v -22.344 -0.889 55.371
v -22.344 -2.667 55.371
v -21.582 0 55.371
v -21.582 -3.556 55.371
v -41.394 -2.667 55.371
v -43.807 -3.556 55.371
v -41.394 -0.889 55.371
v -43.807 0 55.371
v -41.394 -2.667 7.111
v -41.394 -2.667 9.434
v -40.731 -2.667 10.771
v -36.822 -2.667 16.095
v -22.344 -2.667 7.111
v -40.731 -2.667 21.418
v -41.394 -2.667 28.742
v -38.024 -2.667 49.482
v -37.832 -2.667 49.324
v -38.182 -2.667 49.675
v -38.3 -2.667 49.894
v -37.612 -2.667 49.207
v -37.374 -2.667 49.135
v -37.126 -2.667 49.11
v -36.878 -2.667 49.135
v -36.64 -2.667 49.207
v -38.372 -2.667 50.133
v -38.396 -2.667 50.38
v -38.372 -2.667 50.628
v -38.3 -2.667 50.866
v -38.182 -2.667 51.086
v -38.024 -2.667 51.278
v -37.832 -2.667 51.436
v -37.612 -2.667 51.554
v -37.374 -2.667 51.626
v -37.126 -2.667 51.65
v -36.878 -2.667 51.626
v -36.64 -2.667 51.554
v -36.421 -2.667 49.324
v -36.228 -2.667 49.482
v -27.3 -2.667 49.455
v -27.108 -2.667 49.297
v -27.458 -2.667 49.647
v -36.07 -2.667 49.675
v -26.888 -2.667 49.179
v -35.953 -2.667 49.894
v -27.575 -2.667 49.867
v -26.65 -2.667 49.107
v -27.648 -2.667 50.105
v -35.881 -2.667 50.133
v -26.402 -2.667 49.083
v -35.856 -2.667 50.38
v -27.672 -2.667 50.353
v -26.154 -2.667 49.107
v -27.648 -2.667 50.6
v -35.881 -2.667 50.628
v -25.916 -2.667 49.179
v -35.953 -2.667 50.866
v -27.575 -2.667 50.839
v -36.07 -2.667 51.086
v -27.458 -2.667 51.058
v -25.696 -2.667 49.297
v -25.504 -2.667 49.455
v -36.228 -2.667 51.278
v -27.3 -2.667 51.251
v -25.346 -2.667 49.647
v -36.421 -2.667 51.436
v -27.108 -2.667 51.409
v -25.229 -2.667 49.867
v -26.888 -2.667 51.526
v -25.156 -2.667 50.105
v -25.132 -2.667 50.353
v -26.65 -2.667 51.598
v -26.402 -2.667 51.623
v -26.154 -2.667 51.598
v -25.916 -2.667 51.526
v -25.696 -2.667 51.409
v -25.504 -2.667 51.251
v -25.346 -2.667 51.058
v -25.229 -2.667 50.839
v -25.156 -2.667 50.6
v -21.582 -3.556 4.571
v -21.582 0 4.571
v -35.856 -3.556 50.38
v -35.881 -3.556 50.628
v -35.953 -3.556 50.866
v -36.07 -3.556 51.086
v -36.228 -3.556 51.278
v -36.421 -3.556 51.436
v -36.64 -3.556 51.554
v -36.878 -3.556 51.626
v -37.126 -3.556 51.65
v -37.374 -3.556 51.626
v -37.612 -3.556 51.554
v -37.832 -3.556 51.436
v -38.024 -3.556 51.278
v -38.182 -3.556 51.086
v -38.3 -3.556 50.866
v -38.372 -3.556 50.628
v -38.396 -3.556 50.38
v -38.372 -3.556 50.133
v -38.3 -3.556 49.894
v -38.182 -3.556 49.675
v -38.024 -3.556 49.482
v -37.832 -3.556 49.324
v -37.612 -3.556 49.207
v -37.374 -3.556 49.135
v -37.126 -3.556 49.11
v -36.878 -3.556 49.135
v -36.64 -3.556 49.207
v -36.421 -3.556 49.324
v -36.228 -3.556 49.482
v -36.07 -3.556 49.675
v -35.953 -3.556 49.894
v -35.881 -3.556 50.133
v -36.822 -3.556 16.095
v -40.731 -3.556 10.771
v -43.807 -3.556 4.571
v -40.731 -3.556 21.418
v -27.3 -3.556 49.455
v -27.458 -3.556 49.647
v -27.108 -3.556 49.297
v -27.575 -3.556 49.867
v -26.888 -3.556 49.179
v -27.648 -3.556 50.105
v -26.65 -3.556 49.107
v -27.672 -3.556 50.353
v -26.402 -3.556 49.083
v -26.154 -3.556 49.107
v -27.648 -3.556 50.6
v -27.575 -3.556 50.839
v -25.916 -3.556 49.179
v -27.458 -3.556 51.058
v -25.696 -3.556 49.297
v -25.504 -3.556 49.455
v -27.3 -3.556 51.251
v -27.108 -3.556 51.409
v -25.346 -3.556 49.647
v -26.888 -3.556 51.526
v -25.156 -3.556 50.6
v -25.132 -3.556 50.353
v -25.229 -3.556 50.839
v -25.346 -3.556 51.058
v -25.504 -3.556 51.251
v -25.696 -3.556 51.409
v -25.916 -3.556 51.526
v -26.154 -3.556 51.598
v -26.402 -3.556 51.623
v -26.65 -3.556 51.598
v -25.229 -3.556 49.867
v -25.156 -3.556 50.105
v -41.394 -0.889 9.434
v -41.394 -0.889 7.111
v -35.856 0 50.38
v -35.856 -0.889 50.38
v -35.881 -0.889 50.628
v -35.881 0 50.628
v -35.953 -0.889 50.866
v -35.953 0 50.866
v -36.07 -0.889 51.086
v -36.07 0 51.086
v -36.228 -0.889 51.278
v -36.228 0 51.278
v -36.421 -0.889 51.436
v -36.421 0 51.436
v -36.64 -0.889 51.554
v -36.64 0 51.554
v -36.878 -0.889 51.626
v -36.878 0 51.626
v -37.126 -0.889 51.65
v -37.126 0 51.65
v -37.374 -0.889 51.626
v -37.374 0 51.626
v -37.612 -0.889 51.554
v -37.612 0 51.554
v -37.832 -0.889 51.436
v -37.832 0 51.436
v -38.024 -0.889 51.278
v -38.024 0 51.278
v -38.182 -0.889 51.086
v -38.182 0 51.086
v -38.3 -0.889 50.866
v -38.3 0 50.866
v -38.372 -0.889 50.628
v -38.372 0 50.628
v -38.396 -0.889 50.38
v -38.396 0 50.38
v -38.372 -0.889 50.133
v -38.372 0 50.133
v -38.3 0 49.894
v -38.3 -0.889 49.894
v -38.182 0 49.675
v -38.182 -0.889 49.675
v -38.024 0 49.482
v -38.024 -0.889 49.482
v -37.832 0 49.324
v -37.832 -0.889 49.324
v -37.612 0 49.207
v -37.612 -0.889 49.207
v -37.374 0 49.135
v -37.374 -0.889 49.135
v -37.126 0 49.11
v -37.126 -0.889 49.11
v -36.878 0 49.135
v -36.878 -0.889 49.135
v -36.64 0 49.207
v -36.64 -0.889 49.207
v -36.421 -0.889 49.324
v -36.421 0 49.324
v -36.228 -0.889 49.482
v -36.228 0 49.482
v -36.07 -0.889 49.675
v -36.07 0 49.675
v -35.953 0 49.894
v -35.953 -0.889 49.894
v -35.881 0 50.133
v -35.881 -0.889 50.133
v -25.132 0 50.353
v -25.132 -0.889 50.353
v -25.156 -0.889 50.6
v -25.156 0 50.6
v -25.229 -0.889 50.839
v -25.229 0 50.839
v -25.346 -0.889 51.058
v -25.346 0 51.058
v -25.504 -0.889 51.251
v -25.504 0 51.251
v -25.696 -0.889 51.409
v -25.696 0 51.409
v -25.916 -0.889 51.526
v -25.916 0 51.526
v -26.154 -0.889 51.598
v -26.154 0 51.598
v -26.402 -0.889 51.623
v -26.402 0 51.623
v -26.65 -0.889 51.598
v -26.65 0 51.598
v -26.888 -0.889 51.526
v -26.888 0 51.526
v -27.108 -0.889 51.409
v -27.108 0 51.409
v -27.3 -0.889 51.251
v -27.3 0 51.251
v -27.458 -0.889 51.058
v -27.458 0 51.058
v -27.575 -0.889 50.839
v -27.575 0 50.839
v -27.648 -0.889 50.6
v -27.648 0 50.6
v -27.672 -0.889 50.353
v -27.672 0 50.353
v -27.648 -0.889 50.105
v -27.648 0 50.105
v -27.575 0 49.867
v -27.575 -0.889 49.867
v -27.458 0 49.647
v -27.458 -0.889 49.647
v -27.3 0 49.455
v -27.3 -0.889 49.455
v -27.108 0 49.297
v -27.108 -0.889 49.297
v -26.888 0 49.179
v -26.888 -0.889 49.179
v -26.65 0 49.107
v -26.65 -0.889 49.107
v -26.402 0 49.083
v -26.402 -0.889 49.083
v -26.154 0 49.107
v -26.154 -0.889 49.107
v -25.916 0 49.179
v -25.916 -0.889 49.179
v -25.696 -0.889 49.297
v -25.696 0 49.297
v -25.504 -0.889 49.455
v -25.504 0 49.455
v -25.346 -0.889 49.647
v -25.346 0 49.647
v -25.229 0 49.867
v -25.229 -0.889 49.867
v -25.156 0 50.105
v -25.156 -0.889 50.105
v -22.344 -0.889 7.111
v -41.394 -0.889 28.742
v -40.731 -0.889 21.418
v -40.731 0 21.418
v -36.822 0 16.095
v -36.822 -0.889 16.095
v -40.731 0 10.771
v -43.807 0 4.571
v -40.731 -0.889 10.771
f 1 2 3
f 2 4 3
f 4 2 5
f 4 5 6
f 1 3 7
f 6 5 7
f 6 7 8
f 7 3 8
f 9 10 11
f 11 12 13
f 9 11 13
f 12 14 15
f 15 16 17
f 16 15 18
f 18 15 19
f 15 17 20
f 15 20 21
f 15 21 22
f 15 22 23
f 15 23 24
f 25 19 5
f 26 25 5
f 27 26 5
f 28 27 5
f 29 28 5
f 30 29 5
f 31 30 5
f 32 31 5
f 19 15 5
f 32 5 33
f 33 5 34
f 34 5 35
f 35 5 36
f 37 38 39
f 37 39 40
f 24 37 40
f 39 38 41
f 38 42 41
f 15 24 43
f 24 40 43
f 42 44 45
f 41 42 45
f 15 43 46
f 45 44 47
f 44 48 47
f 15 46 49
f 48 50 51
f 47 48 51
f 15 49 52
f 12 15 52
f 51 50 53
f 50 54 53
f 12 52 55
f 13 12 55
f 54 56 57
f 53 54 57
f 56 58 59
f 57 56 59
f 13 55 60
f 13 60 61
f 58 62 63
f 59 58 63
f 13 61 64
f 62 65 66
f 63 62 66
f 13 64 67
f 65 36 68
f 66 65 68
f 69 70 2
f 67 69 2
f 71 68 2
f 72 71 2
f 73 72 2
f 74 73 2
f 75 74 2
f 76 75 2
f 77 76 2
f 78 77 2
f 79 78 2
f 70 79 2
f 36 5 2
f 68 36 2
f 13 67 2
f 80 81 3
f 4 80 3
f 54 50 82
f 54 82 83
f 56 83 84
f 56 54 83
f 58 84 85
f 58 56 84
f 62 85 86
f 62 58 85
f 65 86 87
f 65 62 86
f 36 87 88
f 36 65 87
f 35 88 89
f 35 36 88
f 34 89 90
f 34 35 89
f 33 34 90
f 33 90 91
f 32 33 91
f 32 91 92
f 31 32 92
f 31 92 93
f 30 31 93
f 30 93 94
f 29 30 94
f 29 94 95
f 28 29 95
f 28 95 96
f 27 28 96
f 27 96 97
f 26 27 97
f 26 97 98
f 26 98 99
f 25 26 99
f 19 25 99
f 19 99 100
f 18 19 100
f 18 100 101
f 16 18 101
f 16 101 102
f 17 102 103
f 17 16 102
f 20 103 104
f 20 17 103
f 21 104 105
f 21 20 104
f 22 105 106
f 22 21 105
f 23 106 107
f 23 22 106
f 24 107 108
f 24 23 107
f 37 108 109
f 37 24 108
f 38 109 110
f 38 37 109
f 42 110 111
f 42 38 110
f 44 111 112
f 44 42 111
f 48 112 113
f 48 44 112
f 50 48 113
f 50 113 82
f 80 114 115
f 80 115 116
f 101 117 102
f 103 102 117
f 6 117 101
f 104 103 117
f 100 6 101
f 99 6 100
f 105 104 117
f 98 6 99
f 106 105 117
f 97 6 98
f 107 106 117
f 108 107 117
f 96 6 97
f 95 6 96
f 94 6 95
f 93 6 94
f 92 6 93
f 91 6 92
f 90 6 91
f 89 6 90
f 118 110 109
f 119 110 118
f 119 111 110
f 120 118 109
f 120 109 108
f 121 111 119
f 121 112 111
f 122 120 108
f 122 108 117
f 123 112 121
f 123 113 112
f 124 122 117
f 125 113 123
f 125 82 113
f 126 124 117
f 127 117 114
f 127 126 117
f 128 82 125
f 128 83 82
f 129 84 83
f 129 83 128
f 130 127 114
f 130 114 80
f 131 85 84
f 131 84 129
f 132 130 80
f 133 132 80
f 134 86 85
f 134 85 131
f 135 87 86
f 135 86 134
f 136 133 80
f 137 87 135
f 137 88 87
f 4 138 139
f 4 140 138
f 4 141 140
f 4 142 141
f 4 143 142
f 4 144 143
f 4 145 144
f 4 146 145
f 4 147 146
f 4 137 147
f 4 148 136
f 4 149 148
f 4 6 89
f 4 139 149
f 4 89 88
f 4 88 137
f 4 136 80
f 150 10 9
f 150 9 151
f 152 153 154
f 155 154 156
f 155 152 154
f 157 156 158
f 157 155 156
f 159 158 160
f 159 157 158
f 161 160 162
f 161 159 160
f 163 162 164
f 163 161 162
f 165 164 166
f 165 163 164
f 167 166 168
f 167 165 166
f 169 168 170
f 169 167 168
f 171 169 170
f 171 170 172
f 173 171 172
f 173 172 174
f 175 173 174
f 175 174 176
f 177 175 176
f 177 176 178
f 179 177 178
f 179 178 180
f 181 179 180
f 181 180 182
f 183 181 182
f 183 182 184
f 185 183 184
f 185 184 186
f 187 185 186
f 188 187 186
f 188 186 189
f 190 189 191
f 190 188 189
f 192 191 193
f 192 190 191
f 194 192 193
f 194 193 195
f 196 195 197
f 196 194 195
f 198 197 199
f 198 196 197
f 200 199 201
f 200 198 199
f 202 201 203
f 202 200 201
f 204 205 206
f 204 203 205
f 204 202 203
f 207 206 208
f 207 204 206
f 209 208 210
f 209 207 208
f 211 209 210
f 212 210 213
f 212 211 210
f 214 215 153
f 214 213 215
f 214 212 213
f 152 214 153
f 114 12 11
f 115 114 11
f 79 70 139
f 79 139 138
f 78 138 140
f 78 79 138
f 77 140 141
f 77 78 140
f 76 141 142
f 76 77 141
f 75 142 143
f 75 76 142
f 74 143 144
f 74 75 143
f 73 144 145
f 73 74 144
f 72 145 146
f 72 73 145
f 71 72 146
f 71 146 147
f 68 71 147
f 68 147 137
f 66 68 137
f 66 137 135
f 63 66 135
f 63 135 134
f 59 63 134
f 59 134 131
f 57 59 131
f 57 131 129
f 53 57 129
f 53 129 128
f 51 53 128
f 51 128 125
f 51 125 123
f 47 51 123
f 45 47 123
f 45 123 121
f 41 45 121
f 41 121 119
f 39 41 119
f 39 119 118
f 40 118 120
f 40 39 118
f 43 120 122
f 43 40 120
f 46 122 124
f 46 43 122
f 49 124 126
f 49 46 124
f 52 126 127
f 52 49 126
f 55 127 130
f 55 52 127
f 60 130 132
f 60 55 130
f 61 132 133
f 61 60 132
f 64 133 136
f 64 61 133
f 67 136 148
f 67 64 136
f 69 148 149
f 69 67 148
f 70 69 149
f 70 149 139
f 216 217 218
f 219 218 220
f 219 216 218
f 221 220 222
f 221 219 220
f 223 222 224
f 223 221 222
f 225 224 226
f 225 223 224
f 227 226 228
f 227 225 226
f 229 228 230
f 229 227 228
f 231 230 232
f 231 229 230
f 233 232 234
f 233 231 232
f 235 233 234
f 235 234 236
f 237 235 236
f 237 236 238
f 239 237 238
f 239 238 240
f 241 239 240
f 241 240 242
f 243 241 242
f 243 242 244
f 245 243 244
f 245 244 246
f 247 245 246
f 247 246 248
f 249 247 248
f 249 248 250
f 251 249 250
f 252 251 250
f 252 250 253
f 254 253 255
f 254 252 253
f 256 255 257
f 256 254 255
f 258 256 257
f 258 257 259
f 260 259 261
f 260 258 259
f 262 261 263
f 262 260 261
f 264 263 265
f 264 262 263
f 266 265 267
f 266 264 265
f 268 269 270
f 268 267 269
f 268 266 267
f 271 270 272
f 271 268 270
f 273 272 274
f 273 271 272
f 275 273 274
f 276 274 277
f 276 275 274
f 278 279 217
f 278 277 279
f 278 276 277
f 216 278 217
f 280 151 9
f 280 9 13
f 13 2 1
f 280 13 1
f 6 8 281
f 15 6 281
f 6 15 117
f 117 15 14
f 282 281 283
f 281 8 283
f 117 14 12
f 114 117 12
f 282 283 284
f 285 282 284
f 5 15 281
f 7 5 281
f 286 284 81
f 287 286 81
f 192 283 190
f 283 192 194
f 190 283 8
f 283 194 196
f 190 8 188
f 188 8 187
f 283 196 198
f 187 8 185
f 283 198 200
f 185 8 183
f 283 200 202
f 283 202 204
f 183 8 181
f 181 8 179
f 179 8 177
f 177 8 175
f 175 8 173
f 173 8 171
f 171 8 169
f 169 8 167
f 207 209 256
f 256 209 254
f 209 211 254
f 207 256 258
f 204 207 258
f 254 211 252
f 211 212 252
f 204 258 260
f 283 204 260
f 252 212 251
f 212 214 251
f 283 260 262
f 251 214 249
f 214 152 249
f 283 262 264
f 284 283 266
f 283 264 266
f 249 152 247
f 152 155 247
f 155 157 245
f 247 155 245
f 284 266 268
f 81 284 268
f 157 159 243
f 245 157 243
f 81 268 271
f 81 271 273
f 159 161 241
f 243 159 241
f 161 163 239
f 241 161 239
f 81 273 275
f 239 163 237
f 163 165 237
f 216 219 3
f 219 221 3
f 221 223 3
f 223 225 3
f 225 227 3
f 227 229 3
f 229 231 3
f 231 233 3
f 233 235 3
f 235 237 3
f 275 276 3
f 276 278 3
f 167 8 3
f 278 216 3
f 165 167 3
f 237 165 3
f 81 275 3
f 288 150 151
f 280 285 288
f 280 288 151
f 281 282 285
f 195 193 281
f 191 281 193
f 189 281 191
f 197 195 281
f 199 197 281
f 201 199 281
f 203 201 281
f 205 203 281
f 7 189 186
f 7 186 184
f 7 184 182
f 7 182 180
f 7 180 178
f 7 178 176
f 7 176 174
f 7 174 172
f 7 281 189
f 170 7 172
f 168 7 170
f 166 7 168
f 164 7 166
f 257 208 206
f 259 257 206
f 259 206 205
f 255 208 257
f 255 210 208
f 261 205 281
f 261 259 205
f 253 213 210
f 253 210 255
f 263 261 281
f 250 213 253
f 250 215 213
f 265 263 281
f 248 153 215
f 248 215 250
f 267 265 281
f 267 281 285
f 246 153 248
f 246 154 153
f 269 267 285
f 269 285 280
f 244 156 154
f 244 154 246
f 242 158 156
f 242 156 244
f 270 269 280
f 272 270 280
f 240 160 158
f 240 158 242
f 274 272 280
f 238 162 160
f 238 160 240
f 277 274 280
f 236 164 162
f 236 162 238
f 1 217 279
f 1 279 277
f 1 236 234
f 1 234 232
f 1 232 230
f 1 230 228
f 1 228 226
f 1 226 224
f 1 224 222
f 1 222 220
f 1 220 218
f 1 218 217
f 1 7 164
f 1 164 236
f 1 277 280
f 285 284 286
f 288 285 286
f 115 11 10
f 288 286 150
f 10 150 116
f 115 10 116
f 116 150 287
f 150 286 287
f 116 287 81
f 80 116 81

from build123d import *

# Parameters (mm, degrees)
F0_R     = 1.27
F1_DEPTH = 3.556
F2_W     = 19.05
F2_H     = 1.778
F3_DEPTH = 48.26


with BuildPart() as f1:
    # F0 (on Front) → F1 (new body)
    with BuildSketch(Plane.XZ):
        Polygon((-21.582347, 55.370963), (-43.807347, 55.370963), (-40.730689, 21.41812), (-36.822347, 16.094806), (-40.730689, 10.771491), (-43.807347, 4.570963), (-21.582347, 4.570963), align=None)
        with Locations((-37.126201, 50.380394)):
            Circle(F0_R, mode=Mode.SUBTRACT)
        with Locations((-26.401985, 50.352663)):
            Circle(F0_R, mode=Mode.SUBTRACT)
    extrude(amount=F1_DEPTH)

    # F2 (on face) → F3 (cut)
    with BuildSketch(Plane.XY.offset(55.370963)):
        with Locations((-31.869347, -1.778)):
            Rectangle(F2_W, F2_H)
    extrude(amount=-F3_DEPTH, mode=Mode.SUBTRACT)


solid = f1.part
